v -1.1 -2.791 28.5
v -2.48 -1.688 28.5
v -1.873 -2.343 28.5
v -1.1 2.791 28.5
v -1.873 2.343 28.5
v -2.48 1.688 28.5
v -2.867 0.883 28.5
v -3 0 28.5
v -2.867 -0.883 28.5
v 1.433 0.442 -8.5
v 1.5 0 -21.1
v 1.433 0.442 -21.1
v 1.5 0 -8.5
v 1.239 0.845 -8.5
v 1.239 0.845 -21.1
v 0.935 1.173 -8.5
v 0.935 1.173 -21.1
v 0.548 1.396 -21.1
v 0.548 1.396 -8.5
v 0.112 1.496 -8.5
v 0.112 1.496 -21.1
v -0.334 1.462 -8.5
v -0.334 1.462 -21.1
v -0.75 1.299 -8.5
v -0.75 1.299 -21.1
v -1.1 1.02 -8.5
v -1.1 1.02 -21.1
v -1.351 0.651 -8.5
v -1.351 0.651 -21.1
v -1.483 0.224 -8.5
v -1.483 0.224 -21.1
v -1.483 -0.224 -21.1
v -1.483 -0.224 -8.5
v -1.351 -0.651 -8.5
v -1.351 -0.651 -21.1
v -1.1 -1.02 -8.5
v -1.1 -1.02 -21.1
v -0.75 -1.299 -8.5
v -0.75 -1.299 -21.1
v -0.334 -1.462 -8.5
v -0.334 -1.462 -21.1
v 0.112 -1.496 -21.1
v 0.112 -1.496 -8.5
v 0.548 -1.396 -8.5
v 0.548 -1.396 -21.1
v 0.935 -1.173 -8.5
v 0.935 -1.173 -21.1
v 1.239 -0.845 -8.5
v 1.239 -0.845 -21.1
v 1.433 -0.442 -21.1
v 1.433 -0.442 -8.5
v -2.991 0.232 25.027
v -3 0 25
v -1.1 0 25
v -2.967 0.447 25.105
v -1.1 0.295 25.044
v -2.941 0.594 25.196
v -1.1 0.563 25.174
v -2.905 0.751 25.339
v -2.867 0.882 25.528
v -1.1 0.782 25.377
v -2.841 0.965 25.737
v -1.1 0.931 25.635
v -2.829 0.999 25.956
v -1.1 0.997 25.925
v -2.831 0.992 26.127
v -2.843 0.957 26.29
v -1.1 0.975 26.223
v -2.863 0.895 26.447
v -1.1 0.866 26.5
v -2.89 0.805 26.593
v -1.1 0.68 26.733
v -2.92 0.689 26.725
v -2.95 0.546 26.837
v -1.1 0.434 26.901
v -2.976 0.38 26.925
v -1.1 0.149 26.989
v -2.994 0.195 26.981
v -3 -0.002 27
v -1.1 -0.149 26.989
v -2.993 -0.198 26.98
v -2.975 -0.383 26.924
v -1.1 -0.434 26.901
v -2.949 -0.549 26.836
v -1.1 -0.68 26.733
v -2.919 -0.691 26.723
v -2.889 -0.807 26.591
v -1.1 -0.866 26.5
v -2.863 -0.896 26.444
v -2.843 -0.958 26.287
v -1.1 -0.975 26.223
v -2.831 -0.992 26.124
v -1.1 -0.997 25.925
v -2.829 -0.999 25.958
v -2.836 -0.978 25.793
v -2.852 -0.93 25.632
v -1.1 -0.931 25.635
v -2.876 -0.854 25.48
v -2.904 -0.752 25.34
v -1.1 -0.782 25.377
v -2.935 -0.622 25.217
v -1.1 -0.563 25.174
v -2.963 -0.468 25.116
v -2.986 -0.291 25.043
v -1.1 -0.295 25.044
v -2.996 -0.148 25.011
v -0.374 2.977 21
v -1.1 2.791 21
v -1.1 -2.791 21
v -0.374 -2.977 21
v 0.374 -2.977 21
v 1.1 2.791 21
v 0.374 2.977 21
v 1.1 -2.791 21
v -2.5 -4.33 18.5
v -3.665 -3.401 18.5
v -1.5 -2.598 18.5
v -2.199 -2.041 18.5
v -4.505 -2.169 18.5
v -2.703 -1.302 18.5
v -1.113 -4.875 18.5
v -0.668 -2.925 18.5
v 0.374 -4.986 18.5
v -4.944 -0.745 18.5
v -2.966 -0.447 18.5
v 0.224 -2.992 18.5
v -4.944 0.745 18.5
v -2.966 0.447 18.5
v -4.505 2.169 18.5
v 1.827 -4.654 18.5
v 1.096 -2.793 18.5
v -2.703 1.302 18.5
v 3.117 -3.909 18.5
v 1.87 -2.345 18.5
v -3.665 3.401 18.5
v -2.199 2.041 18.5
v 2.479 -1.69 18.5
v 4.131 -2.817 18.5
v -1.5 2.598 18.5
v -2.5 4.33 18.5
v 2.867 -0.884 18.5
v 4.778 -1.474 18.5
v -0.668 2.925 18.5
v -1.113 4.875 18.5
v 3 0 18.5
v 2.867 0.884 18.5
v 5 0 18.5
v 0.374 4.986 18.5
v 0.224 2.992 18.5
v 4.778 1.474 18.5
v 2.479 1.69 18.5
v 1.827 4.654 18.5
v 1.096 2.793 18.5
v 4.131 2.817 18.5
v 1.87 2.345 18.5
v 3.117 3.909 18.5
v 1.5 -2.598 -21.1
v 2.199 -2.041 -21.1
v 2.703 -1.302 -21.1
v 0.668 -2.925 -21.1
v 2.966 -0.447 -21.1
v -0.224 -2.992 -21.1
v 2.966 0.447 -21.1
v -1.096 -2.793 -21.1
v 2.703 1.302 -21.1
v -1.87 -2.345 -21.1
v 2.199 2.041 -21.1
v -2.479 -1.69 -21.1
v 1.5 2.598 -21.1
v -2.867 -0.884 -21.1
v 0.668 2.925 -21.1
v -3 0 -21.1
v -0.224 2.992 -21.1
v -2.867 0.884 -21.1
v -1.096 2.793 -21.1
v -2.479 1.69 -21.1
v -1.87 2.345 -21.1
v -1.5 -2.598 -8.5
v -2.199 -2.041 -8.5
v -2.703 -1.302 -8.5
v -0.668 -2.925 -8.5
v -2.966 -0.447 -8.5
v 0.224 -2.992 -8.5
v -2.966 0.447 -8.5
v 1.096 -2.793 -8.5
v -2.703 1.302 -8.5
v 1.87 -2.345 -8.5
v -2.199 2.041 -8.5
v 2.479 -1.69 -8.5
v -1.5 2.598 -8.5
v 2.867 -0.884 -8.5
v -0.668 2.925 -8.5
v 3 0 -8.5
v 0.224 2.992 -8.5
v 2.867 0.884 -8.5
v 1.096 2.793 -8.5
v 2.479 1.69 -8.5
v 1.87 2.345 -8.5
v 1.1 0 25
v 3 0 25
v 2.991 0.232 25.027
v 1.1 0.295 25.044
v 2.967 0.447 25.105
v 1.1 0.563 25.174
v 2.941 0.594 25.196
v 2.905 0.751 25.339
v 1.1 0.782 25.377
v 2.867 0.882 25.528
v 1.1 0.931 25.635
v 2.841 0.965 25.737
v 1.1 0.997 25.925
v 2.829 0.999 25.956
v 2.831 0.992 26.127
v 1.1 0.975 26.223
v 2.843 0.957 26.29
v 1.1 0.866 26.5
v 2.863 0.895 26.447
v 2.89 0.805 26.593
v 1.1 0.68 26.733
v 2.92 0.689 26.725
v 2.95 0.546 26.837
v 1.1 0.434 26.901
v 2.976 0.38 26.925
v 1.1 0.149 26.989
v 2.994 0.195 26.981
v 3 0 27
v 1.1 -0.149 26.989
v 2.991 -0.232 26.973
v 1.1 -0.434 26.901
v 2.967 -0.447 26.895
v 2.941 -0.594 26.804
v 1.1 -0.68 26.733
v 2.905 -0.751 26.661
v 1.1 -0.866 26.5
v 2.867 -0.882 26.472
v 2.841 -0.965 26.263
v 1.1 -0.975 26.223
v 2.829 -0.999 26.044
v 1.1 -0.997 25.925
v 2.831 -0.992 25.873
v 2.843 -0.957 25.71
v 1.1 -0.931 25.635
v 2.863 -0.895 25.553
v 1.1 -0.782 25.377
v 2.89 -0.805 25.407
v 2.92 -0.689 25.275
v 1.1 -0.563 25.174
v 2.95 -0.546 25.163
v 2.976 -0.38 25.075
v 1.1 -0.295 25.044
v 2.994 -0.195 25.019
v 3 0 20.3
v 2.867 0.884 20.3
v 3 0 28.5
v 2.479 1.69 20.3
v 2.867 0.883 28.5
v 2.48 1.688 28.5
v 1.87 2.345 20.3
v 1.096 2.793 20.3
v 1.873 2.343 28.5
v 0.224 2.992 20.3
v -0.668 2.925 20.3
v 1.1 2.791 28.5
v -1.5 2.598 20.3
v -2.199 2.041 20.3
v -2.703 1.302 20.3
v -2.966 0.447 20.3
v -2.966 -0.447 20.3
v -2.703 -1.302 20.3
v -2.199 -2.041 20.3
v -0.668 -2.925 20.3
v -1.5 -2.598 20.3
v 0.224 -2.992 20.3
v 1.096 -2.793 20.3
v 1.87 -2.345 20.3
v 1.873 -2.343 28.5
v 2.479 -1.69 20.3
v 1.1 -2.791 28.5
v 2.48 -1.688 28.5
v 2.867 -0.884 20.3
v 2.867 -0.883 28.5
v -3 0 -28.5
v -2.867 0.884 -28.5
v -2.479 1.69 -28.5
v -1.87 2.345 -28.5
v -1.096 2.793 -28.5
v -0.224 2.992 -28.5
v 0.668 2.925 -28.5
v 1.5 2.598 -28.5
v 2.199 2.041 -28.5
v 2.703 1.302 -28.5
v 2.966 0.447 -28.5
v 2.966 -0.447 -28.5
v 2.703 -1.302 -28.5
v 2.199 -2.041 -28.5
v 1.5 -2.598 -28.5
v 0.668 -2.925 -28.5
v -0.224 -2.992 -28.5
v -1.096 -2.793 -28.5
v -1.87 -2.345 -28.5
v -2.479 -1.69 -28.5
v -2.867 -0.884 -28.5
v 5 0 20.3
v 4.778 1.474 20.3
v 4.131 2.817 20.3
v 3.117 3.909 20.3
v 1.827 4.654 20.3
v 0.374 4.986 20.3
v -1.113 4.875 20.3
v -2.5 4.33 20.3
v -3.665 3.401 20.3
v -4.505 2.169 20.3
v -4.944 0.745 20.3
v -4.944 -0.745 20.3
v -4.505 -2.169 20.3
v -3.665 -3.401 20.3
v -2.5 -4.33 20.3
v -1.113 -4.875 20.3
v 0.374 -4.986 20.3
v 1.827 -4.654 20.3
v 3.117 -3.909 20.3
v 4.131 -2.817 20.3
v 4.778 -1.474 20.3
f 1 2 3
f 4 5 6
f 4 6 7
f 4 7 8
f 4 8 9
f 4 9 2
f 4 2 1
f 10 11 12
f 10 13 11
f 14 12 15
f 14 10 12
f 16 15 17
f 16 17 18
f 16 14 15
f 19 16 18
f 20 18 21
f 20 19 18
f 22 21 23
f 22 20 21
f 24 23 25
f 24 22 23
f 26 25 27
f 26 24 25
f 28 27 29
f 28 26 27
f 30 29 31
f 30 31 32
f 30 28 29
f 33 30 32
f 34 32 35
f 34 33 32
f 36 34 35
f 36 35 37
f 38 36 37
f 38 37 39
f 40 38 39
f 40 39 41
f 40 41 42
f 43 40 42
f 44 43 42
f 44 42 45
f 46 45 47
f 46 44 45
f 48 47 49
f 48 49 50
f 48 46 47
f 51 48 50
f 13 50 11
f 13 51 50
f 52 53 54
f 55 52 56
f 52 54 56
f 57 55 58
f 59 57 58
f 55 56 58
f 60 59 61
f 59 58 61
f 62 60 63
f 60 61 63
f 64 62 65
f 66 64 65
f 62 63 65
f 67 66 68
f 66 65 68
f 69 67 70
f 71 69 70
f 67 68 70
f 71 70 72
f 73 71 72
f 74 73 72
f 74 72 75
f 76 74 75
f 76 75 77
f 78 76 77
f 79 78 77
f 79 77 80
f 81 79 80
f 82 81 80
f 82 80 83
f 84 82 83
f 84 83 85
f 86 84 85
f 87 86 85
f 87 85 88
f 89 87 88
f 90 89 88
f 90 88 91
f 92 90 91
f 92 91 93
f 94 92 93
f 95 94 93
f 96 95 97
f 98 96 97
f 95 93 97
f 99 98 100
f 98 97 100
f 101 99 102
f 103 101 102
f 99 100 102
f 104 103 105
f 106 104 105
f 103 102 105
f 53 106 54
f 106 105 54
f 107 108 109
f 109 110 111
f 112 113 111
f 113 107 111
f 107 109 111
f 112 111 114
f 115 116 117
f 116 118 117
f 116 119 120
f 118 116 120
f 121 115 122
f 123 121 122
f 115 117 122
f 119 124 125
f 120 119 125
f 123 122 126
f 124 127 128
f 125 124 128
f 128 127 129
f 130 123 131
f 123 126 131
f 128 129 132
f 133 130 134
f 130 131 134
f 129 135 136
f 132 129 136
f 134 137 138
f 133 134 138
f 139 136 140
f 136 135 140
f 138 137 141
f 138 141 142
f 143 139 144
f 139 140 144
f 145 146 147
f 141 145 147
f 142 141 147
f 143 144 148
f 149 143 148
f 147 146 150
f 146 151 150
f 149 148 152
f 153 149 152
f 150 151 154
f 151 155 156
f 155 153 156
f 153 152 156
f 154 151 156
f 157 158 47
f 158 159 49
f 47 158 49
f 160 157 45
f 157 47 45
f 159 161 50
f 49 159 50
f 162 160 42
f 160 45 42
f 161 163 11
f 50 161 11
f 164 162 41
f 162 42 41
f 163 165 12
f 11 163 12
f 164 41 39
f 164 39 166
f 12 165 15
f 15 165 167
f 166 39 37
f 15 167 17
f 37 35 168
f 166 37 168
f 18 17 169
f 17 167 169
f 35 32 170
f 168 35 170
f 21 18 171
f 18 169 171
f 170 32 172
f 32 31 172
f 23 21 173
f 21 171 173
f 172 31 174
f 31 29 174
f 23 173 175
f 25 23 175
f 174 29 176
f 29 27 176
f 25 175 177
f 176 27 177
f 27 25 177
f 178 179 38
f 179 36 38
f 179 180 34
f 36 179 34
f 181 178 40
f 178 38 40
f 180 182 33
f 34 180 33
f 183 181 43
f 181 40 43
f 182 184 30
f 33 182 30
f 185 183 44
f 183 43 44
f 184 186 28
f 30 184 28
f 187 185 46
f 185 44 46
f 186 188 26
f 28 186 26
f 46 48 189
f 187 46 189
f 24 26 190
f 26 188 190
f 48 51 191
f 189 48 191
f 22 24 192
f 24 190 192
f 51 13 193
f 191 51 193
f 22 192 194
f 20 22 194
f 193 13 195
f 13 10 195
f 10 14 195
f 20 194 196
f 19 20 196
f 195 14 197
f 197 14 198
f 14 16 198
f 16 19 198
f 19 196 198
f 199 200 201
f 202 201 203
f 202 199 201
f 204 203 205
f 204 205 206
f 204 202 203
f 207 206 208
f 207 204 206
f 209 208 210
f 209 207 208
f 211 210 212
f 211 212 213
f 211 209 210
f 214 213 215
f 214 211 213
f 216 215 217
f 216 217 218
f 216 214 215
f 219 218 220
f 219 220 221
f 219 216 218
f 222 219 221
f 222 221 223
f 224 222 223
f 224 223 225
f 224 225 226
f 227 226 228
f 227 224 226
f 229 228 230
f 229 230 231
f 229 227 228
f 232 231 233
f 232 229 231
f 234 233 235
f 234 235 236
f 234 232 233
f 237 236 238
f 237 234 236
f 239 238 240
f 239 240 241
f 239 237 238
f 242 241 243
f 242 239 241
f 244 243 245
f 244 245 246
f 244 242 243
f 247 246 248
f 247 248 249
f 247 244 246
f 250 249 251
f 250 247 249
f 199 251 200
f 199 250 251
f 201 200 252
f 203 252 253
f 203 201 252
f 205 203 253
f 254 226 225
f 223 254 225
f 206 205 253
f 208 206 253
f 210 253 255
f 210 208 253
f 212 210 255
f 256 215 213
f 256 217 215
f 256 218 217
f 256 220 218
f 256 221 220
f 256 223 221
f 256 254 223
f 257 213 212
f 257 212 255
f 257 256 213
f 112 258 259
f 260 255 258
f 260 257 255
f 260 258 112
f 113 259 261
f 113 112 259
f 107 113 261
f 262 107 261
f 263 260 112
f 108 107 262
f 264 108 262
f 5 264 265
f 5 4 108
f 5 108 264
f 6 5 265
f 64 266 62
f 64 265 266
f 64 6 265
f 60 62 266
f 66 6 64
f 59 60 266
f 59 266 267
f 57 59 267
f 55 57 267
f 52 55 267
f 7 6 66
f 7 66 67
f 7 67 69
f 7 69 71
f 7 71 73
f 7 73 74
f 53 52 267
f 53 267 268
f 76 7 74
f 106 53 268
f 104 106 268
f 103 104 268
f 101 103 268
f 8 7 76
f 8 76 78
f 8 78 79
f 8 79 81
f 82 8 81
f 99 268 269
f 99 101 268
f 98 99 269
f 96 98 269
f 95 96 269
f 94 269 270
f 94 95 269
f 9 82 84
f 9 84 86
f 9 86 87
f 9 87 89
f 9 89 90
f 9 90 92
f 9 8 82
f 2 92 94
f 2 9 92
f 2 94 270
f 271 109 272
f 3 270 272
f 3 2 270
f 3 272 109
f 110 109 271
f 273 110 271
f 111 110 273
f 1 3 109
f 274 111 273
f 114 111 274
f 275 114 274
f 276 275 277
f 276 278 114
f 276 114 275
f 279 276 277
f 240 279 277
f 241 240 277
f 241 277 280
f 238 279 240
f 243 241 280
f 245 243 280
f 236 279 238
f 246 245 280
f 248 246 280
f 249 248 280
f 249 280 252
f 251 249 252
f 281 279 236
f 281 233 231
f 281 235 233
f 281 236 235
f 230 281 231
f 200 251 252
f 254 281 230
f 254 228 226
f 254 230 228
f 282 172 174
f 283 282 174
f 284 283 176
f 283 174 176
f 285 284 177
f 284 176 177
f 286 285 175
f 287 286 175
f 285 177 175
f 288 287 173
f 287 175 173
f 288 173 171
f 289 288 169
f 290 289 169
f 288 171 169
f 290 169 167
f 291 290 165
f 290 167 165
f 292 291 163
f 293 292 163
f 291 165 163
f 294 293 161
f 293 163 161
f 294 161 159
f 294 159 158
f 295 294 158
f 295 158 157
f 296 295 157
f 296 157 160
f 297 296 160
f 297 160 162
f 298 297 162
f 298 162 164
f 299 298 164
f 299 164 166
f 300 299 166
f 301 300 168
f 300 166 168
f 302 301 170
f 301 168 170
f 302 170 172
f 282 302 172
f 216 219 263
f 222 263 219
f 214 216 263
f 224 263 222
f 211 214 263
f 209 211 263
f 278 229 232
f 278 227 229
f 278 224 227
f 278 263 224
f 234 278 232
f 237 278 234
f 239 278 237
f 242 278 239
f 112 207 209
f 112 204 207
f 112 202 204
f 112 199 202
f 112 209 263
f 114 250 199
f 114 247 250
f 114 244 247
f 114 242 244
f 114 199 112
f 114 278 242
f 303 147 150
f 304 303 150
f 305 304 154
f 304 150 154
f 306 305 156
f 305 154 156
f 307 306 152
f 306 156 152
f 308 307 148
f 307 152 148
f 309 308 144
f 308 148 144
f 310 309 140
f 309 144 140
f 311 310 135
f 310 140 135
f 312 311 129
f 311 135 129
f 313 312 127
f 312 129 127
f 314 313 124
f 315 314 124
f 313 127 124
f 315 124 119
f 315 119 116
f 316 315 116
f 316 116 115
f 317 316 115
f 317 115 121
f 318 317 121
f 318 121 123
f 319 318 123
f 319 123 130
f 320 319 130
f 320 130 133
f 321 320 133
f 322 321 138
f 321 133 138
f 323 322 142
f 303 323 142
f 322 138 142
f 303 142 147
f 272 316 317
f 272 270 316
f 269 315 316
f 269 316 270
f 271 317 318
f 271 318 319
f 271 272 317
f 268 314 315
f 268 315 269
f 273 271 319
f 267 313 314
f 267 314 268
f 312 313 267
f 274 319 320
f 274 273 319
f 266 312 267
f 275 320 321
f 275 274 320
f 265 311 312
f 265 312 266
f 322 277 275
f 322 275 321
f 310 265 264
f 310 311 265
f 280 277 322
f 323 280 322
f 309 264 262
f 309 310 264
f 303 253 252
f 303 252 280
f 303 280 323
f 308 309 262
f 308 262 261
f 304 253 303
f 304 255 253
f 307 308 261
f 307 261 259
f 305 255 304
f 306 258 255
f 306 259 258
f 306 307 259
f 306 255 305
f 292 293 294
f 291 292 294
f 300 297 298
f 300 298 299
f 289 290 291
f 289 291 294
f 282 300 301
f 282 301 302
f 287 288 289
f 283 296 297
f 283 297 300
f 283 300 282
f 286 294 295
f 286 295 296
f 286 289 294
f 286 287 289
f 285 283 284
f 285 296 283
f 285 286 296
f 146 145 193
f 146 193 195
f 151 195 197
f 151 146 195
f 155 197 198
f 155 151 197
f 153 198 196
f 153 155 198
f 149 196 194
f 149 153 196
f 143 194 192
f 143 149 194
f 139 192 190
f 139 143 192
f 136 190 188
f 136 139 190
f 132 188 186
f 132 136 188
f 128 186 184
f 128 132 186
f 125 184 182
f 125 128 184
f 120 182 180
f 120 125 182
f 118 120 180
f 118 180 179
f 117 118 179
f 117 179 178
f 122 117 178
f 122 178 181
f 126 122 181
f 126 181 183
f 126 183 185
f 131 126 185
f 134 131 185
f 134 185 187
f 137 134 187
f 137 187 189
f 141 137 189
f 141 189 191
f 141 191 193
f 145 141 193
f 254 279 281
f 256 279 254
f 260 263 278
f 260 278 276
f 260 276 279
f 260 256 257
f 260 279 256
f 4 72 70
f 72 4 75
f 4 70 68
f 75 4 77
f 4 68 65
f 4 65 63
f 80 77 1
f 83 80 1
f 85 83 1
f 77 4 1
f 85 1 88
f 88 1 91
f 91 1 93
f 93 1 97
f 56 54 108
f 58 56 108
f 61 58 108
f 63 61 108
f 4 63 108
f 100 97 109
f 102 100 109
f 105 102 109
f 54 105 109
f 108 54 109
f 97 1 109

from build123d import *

# Parameters (mm, degrees)
SKETCH1_R               = 1.5
BOSS_EXTRUDE1_DEPTH     = 28.5
SKETCH2_R               = 3
BOSS_EXTRUDE2_DEPTH     = 37
SKETCH5_R               = 5
BOSS_EXTRUDE3_DEPTH     = 1.8
SKETCH6_R               = 3
BOSS_EXTRUDE4_DEPTH     = 7.4
SKETCH3_W               = 2.2
SKETCH3_H               = 7.5
CUT_EXTRUDE1_DEPTH      = 6
CUT_EXTRUDE1_DEPTH_BACK = 6
SKETCH4_R               = 1
CUT_EXTRUDE2_DEPTH      = 6
CUT_EXTRUDE2_DEPTH_BACK = 6


with BuildPart() as part:
    # Sketch1 → Boss-Extrude1 (new body, symmetric)
    with BuildSketch(Plane.XY):
        Circle(SKETCH1_R)
    extrude(amount=BOSS_EXTRUDE1_DEPTH, both=True)

    # Sketch2 → Boss-Extrude2 (add)
    with BuildSketch(Plane.XY.offset(28.5)):
        Circle(SKETCH2_R)
    extrude(amount=-BOSS_EXTRUDE2_DEPTH)

    # Sketch5 → Boss-Extrude3 (add)
    with BuildSketch(Plane.XY.offset(18.5)):
        Circle(SKETCH5_R)
    extrude(amount=BOSS_EXTRUDE3_DEPTH)

    # Sketch6 → Boss-Extrude4 (add)
    with BuildSketch(Plane(origin=(0, 0, -21.1), x_dir=(-1, 0, 0), z_dir=(0, 0, -1))):
        Circle(SKETCH6_R)
    extrude(amount=BOSS_EXTRUDE4_DEPTH)

    # Sketch3 → Cut-Extrude1 (cut, two sides)
    with BuildSketch(Plane(origin=(0, 0, 0), x_dir=(1, 0, 0), z_dir=(0, 1, 0))) as cut_extrude1_sk:
        with Locations((0, -24.75)):
            Rectangle(SKETCH3_W, SKETCH3_H)
    extrude(amount=CUT_EXTRUDE1_DEPTH, mode=Mode.SUBTRACT)
    extrude(cut_extrude1_sk.sketch, amount=-CUT_EXTRUDE1_DEPTH_BACK, mode=Mode.SUBTRACT)

    # Sketch4 → Cut-Extrude2 (cut, two sides)
    with BuildSketch(Plane(origin=(0, 0, 0), x_dir=(0, 0, -1), z_dir=(1, 0, 0))) as cut_extrude2_sk:
        with Locations((-26, 0)):
            Circle(SKETCH4_R)
    extrude(amount=CUT_EXTRUDE2_DEPTH, mode=Mode.SUBTRACT)
    extrude(cut_extrude2_sk.sketch, amount=-CUT_EXTRUDE2_DEPTH_BACK, mode=Mode.SUBTRACT)


solid = part.part
